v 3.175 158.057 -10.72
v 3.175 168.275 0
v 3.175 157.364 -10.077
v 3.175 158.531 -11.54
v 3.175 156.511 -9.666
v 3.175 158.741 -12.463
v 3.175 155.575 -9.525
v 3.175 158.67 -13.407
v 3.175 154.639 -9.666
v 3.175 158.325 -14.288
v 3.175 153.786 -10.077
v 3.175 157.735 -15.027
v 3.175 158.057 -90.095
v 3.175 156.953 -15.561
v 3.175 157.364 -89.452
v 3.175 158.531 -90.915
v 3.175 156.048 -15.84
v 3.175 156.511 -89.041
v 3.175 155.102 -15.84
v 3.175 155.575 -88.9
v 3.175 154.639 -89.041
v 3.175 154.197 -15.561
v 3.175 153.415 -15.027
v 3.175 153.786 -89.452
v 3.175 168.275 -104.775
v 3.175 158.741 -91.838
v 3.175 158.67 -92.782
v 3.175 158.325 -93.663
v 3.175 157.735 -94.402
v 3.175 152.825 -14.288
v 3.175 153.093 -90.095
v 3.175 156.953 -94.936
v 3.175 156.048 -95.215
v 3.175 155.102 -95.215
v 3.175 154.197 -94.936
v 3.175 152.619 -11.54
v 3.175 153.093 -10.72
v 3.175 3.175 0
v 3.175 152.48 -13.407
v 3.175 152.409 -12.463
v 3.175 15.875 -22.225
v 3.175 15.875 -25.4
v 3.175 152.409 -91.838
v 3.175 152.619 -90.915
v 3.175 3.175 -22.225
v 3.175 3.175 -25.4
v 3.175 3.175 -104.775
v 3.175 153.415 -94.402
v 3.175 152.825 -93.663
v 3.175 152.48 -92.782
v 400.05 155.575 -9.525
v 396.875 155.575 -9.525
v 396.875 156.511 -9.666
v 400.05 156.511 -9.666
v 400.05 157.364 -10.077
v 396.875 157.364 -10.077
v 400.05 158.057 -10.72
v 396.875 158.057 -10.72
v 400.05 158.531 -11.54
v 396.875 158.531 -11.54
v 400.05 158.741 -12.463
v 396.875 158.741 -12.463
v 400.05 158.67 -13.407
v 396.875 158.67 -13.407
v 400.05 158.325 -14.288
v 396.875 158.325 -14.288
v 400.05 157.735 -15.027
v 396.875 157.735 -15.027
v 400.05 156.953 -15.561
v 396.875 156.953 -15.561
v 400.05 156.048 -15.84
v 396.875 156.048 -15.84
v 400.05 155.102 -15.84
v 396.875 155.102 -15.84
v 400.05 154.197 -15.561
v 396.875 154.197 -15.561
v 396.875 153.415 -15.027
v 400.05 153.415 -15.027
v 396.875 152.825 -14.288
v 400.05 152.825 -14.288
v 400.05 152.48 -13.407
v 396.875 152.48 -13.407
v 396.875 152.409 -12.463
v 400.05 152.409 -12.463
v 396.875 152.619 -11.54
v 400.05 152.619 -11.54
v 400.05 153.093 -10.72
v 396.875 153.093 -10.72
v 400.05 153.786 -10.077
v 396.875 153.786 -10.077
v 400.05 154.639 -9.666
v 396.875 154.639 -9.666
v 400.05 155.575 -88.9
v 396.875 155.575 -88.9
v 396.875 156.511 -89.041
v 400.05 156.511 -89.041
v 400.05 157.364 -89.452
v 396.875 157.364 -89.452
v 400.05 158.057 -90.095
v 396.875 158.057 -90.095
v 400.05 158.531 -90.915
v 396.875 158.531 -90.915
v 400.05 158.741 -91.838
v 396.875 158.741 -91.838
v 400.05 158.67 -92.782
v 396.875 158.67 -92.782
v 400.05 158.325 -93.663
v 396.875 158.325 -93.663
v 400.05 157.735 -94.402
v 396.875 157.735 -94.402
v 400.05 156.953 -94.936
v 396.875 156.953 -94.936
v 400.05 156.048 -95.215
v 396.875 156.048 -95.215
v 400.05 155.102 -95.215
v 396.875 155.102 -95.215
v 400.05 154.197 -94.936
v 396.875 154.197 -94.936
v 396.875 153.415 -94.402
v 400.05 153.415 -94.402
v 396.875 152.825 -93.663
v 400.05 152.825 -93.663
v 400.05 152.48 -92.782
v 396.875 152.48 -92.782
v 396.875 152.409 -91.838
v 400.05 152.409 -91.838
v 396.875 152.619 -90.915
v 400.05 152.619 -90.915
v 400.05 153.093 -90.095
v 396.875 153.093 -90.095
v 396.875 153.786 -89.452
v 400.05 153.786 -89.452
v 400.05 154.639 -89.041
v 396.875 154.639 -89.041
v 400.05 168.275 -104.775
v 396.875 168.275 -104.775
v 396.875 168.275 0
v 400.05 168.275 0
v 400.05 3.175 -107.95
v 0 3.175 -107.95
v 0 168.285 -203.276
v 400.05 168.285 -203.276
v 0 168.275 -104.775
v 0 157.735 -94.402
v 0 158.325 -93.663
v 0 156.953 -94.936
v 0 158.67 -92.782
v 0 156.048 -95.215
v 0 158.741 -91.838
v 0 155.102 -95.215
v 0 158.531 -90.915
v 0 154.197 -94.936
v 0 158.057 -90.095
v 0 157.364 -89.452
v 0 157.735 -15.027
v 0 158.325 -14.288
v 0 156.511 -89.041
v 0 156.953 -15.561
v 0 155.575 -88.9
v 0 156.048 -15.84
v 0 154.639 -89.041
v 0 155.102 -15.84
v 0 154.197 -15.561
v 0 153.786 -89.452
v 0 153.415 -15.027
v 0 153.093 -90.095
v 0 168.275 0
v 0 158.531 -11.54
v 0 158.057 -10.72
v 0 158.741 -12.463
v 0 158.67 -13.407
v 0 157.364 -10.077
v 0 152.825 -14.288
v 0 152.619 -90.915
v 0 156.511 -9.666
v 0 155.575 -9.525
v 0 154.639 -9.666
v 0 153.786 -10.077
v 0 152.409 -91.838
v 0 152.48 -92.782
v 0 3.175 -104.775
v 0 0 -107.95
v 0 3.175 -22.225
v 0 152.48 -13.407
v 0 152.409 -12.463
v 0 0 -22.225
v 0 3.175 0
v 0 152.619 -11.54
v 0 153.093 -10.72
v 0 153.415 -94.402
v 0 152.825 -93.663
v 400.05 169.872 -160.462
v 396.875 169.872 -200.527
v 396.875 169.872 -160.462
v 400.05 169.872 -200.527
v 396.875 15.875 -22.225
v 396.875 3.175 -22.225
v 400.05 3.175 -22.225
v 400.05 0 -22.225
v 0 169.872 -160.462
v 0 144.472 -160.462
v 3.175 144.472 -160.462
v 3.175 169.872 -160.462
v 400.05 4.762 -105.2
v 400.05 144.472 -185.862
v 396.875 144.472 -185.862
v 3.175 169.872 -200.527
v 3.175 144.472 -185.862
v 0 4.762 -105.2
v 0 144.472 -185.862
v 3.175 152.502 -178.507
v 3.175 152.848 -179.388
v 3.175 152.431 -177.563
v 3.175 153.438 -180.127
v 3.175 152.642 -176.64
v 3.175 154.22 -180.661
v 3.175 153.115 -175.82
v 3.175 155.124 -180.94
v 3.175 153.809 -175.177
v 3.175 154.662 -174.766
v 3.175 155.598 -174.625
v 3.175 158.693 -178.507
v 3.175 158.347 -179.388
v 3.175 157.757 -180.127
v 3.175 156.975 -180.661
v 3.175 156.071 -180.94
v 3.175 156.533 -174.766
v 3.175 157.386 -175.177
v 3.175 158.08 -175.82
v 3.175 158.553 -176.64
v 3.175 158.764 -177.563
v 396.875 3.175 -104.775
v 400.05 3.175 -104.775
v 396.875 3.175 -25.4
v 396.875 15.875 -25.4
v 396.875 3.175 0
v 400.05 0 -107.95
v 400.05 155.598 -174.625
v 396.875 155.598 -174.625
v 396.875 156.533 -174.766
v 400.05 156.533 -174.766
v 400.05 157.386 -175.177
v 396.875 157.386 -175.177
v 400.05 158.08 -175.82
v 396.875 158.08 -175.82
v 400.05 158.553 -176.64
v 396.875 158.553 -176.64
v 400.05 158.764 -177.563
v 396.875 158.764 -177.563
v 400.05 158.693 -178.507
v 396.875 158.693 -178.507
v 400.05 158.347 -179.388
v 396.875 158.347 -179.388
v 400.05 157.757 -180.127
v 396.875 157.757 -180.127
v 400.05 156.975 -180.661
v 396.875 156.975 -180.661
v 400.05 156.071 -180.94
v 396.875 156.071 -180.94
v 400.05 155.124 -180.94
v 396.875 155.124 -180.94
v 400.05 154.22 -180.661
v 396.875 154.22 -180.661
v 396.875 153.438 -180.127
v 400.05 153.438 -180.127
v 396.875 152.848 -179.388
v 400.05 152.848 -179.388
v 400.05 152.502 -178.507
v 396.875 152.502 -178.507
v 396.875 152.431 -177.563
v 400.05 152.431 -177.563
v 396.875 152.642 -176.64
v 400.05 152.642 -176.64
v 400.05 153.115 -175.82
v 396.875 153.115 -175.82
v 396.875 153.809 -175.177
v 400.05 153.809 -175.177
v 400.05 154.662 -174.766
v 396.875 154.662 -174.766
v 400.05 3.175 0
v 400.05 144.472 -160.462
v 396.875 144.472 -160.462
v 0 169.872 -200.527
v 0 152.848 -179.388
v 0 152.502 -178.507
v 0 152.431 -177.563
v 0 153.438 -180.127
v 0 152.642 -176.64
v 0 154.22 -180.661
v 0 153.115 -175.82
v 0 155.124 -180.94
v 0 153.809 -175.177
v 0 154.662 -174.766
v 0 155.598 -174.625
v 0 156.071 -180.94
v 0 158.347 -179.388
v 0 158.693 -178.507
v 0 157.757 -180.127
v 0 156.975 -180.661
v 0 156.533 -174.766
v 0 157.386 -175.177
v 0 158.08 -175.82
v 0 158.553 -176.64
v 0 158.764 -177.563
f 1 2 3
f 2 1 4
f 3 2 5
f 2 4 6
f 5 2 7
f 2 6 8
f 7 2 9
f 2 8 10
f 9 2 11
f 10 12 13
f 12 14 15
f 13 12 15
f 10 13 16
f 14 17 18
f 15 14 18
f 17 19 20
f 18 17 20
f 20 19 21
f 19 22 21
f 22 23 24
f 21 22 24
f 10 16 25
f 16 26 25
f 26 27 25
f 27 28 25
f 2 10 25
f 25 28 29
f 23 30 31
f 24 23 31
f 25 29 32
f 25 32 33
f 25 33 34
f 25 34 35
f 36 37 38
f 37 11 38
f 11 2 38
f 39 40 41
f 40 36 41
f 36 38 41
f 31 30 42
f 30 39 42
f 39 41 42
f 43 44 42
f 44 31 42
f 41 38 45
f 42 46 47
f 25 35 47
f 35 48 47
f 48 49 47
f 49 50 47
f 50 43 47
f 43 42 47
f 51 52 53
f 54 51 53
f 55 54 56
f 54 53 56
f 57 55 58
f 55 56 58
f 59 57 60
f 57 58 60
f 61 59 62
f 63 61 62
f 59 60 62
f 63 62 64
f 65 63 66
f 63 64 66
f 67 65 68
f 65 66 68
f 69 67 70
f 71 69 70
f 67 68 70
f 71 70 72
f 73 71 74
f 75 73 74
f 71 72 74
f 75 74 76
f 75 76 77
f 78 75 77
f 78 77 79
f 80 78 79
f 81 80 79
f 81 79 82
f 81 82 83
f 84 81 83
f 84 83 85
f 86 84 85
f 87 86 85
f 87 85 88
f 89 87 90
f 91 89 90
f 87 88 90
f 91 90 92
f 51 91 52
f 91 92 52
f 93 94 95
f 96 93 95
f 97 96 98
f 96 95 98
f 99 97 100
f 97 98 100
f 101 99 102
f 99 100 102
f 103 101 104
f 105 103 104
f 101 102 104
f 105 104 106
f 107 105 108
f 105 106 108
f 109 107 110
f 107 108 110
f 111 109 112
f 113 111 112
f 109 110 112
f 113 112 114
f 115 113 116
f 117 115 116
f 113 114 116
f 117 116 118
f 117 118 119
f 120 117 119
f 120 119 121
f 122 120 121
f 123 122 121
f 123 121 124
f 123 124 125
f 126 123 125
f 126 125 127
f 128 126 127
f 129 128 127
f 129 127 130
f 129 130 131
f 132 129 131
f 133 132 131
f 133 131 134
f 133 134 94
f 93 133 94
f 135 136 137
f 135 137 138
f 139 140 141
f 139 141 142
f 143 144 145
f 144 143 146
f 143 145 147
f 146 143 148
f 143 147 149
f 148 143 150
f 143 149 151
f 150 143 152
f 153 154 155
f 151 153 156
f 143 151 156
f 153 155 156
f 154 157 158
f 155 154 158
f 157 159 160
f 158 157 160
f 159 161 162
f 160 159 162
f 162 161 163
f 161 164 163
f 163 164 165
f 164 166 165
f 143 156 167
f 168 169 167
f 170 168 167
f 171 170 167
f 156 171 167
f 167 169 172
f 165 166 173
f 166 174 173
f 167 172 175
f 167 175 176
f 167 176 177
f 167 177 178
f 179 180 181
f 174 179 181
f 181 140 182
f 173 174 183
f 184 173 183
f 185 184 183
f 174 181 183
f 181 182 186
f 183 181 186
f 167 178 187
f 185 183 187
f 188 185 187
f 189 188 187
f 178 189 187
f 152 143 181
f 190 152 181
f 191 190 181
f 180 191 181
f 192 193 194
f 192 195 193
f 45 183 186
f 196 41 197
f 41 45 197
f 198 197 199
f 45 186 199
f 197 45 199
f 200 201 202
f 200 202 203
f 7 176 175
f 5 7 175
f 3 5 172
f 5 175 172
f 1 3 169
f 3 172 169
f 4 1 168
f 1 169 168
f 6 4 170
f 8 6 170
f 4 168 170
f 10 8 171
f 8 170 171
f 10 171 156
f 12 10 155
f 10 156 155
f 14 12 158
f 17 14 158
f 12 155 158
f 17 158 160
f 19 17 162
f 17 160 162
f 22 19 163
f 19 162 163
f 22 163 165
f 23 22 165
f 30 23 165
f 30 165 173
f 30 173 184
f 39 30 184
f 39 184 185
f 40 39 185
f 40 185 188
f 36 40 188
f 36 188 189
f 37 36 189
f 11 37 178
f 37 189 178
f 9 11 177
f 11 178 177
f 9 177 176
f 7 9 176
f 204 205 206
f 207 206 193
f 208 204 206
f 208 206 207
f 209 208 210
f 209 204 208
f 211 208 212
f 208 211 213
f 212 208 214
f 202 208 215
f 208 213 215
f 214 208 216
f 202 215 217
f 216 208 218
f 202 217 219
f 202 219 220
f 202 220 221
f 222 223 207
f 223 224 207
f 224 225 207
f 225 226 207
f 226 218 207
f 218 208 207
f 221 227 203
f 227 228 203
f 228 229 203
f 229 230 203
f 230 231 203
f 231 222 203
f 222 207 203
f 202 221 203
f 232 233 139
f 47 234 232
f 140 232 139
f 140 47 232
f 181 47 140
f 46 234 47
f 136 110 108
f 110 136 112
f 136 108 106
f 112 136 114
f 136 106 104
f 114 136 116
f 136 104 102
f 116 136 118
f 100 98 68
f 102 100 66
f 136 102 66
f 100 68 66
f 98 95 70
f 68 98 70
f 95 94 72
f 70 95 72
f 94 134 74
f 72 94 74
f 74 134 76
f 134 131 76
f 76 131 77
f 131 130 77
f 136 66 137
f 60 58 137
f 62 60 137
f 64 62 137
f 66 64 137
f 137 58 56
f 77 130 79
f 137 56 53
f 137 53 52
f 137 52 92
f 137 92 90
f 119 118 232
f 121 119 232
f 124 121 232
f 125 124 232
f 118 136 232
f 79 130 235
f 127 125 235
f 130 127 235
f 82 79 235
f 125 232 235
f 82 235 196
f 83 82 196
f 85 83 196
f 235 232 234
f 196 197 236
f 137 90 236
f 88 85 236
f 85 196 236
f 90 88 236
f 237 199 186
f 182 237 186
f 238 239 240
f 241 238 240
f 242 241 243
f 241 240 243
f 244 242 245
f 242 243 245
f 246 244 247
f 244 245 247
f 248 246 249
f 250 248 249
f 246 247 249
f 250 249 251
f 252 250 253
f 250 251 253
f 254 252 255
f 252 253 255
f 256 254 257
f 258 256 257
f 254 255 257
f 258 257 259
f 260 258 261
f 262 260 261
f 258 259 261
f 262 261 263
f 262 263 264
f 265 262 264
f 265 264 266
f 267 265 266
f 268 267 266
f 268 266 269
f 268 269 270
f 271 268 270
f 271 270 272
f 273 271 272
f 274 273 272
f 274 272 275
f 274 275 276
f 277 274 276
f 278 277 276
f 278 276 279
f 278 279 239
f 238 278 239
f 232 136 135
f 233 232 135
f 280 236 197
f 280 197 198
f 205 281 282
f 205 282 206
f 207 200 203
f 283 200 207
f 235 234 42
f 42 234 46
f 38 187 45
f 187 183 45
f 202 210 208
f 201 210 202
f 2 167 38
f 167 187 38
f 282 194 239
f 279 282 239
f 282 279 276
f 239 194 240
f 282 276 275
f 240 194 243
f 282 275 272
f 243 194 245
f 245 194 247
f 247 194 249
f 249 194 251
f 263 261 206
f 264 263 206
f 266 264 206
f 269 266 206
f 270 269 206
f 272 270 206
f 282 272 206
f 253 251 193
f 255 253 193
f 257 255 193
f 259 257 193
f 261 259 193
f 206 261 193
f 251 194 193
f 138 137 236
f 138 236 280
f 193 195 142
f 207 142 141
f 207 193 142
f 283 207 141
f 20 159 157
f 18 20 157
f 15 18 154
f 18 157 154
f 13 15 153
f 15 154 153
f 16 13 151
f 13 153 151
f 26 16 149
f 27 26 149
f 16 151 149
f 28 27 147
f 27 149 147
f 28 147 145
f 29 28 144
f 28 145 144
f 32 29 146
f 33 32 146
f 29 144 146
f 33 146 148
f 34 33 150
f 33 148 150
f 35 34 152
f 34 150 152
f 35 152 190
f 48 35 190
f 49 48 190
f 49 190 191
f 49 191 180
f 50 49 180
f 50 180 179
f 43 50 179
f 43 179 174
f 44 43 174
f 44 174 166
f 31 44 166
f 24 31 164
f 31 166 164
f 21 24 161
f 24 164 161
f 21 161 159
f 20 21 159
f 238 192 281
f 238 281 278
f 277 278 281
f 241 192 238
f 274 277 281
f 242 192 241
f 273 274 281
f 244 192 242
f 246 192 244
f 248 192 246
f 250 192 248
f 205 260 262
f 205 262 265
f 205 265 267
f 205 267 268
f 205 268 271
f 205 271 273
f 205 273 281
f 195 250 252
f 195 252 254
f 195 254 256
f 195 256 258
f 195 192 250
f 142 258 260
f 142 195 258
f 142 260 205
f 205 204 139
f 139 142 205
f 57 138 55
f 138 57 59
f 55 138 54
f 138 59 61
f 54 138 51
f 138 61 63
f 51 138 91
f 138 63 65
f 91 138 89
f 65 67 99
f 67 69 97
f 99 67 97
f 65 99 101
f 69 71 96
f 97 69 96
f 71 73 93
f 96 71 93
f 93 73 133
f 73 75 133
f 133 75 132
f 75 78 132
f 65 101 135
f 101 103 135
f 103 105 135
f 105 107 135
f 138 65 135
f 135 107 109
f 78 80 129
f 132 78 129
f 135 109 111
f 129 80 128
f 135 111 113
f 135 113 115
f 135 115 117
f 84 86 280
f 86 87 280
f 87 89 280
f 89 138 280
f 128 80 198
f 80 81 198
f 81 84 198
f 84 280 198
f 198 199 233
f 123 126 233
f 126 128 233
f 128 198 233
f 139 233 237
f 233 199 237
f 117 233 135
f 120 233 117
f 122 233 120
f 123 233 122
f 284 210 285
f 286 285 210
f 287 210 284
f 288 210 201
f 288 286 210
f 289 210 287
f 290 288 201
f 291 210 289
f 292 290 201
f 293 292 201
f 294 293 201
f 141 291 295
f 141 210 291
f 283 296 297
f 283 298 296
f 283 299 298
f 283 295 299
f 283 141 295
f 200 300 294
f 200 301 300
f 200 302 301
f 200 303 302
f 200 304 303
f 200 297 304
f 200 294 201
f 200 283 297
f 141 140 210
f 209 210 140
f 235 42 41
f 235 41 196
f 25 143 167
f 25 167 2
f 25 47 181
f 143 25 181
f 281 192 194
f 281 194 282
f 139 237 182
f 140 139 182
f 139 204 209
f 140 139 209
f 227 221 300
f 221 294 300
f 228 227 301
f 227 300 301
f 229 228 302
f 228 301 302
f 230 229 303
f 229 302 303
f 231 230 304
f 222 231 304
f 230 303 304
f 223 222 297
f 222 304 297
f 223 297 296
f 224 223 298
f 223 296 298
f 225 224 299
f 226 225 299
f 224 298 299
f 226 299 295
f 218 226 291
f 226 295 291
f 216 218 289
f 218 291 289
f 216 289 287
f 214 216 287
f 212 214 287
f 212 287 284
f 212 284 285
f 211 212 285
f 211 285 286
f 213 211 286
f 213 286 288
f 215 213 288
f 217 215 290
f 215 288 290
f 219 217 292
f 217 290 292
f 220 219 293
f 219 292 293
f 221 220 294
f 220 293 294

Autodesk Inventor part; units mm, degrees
ref_plane "YZ Plane" through (0, 0, 0) normal (1, 0, 0) x (0, 1, 0)
ref_plane "XZ Plane" through (0, 0, 0) normal (0, 1, 0) x (-1, 0, 0)
ref_plane "XY Plane" through (0, 0, 0) normal (0, 0, 1) x (1, 0, 0)
sketch "Sketch1" plane through (0, 0, 0) normal (0, 1, 0) x (-1, 0, 0)
  line L0 (0, 0) -> (-400.05, 0)
  line L1 (-400.05, 0) -> (-400.05, -107.95)
  line L2 (-400.05, -107.95) -> (0, -107.95)
  line L3 (0, -107.95) -> (0, 0)
  dimension "d0" = 400.05
  dimension "d40" = 107.95
extrude "Extrusion1" add sketch "Sketch1" along normal blind 3.175
sketch "Sketch2" plane through (0, 3.175, 0) normal (0, 1, 0) x (1, 0, 0)
  line L0 (0, 0) -> (400.05, 0) projected
  line L1 (3.175, 0) -> (3.175, 104.775)
  line L2 (3.175, 104.775) -> (396.875, 104.775)
  line L3 (396.875, 104.775) -> (396.875, 0)
  line L4 (400.05, 0) -> (400.05, 107.95) projected
  line L5 (0, 107.95) -> (0, 0) projected
  line L6 (400.05, 107.95) -> (0, 107.95) projected
  line L7 (0, 0) -> (3.175, 0)
  line L8 (400.05, 0) -> (396.875, 0)
  line L9 (3.175, 104.775) -> (0, 104.775)
  line L10 (396.875, 104.775) -> (400.05, 104.775)
  dimension "d3" = 3.175
  dimension "d4" = 3.175
  dimension "d5" = 3.175
extrude "Extrusion6" add sketch "Sketch2" along normal blind 165.1 contours L5 L9 L1 L0 | L3 L10 L4 L0
ref_plane "Work Plane1" through (400.05, 3.175, -107.95) normal (0, 0.866, -0.5) x (-1, 0, 0)
sketch "Sketch9" plane through (400.05, 3.175, -107.95) normal (0, 0.866, -0.5) x (-1, 0, 0)
  line L0 (0, 91.8999) -> (0, -1.5875) projected
  line L1 (400.05, 0) -> (0, 0)
  line L2 (0, 0) -> (0, 3.175)
  line L3 (0, 3.175) -> (400.05, 3.175)
  line L4 (400.05, 3.175) -> (400.05, 0)
  point P0 (400.05, 91.8999)
  dimension "d25" = 3.175
extrude "Extrusion7" add sketch "Sketch9" along normal blind 190.6524
sketch "Sketch12" plane through (400.05, 3.175, -107.95) normal (1, 0, 0) x (0, -0.5, -0.866)
  line L0 (-3.175, 190.6524) -> (-37.872, 170.6201)
  line L1 (-37.872, 170.6201) -> (-25.172, 148.623)
  line L2 (-25.172, 148.623) -> (-3.175, 161.323)
  line L3 (-3.175, 0) -> (-3.175, 190.6524) projected
  point P0 (-91.8999, -56.7246)
  dimension "d34" = 25.4
  dimension "d35" = 60
  dimension "d36" = 25.4
extrude "Extrusion9" add sketch "Sketch12" against normal blind 3.175
sketch "Sketch13" plane through (0, 4.7625, -105.2004) normal (0, 0.5, 0.866) x (1, 0, 0)
  line L0 (400.05, 190.6524) -> (0, 190.6524) projected
  line L1 (200.025, 190.6524) -> (200.025, 0)
  line L2 (400.05, 0) -> (0, 0) projected
  point P0 (0, -56.7246)
ref_plane "Work Plane2" through (200.025, 169.8723, -200.5266) normal (-1, 0, 0) x (0, -0.866, 0.5)
mirror "Mirror1" about plane through (200.025, 169.8723, -200.5266) normal (-1, 0, 0) of "Extrusion9"
sketch "Sketch14" plane through (0, 144.4723, -160.4619) normal (-1, 0, 0) x (0, 0, 1)
  circle A0 centre (-17.3381, 11.1252) radius 3.175
  line L0 (0, 0) -> (0, 25.4) projected
  line L1 (0, 25.4) -> (-40.0647, 25.4) projected
  point P0 (160.4619, -144.4723)
  dimension "d41" = 6.35
  dimension "d42" = 17.3381
  dimension "d43" = 14.2748
extrude "Extrusion10" cut sketch "Sketch14" against normal blind 431.8
sketch "Sketch16" plane through (0, 3.175, 0) normal (0, 1, 0) x (1, 0, 0)
  line L0 (400.05, 0) -> (400.05, 104.775) projected
  line L1 (0, 0) -> (400.05, 0)
  line L2 (400.05, 0) -> (400.05, 22.225)
  line L3 (400.05, 22.225) -> (0, 22.225)
  line L4 (0, 22.225) -> (0, 0)
  dimension "d49" = 22.225
extrude "Extrusion12" cut sketch "Sketch16" against normal blind 3.175
sketch "Sketch17" plane through (0, 3.175, 0) normal (0, 1, 0) x (1, 0, 0)
  line L0 (3.175, 0) -> (3.175, 104.775) projected
  line L1 (400.05, 22.225) -> (400.05, 107.95) projected
  line L2 (3.175, 22.225) -> (400.05, 22.225)
  line L3 (400.05, 22.225) -> (400.05, 25.4)
  line L4 (400.05, 25.4) -> (3.175, 25.4)
  line L5 (3.175, 25.4) -> (3.175, 22.225)
  line L6 (3.175, 22.225) -> (396.875, 22.225) projected
  point P0 (0, 0)
  dimension "d52" = 3.175
extrude "Extrusion13" add sketch "Sketch17" along normal blind 12.7
sketch "Sketch18" plane through (0, 3.175, -104.775) normal (-1, 0, 0) x (0, 0, 1)
  circle A0 centre (12.7, 152.4) radius 3.175
  circle A1 centre (92.075, 152.4) radius 3.175
  line L0 (104.775, 0) -> (104.775, 165.1) projected
  line L1 (0, 0) -> (0, 165.1) projected
  line L2 (104.775, 165.1) -> (0, 165.1) projected
  point P0 (104.775, -3.175)
  dimension "d55" = 6.35
  dimension "d56" = 6.35
  dimension "d57" = 12.7
  dimension "d58" = 12.7
  dimension "d59" = 12.7
  dimension "d60" = 12.7
extrude "Extrusion14" cut sketch "Sketch18" against normal blind 508
properties part number "15102898-16-P-0203" material "Polycarbonate, Clear"
